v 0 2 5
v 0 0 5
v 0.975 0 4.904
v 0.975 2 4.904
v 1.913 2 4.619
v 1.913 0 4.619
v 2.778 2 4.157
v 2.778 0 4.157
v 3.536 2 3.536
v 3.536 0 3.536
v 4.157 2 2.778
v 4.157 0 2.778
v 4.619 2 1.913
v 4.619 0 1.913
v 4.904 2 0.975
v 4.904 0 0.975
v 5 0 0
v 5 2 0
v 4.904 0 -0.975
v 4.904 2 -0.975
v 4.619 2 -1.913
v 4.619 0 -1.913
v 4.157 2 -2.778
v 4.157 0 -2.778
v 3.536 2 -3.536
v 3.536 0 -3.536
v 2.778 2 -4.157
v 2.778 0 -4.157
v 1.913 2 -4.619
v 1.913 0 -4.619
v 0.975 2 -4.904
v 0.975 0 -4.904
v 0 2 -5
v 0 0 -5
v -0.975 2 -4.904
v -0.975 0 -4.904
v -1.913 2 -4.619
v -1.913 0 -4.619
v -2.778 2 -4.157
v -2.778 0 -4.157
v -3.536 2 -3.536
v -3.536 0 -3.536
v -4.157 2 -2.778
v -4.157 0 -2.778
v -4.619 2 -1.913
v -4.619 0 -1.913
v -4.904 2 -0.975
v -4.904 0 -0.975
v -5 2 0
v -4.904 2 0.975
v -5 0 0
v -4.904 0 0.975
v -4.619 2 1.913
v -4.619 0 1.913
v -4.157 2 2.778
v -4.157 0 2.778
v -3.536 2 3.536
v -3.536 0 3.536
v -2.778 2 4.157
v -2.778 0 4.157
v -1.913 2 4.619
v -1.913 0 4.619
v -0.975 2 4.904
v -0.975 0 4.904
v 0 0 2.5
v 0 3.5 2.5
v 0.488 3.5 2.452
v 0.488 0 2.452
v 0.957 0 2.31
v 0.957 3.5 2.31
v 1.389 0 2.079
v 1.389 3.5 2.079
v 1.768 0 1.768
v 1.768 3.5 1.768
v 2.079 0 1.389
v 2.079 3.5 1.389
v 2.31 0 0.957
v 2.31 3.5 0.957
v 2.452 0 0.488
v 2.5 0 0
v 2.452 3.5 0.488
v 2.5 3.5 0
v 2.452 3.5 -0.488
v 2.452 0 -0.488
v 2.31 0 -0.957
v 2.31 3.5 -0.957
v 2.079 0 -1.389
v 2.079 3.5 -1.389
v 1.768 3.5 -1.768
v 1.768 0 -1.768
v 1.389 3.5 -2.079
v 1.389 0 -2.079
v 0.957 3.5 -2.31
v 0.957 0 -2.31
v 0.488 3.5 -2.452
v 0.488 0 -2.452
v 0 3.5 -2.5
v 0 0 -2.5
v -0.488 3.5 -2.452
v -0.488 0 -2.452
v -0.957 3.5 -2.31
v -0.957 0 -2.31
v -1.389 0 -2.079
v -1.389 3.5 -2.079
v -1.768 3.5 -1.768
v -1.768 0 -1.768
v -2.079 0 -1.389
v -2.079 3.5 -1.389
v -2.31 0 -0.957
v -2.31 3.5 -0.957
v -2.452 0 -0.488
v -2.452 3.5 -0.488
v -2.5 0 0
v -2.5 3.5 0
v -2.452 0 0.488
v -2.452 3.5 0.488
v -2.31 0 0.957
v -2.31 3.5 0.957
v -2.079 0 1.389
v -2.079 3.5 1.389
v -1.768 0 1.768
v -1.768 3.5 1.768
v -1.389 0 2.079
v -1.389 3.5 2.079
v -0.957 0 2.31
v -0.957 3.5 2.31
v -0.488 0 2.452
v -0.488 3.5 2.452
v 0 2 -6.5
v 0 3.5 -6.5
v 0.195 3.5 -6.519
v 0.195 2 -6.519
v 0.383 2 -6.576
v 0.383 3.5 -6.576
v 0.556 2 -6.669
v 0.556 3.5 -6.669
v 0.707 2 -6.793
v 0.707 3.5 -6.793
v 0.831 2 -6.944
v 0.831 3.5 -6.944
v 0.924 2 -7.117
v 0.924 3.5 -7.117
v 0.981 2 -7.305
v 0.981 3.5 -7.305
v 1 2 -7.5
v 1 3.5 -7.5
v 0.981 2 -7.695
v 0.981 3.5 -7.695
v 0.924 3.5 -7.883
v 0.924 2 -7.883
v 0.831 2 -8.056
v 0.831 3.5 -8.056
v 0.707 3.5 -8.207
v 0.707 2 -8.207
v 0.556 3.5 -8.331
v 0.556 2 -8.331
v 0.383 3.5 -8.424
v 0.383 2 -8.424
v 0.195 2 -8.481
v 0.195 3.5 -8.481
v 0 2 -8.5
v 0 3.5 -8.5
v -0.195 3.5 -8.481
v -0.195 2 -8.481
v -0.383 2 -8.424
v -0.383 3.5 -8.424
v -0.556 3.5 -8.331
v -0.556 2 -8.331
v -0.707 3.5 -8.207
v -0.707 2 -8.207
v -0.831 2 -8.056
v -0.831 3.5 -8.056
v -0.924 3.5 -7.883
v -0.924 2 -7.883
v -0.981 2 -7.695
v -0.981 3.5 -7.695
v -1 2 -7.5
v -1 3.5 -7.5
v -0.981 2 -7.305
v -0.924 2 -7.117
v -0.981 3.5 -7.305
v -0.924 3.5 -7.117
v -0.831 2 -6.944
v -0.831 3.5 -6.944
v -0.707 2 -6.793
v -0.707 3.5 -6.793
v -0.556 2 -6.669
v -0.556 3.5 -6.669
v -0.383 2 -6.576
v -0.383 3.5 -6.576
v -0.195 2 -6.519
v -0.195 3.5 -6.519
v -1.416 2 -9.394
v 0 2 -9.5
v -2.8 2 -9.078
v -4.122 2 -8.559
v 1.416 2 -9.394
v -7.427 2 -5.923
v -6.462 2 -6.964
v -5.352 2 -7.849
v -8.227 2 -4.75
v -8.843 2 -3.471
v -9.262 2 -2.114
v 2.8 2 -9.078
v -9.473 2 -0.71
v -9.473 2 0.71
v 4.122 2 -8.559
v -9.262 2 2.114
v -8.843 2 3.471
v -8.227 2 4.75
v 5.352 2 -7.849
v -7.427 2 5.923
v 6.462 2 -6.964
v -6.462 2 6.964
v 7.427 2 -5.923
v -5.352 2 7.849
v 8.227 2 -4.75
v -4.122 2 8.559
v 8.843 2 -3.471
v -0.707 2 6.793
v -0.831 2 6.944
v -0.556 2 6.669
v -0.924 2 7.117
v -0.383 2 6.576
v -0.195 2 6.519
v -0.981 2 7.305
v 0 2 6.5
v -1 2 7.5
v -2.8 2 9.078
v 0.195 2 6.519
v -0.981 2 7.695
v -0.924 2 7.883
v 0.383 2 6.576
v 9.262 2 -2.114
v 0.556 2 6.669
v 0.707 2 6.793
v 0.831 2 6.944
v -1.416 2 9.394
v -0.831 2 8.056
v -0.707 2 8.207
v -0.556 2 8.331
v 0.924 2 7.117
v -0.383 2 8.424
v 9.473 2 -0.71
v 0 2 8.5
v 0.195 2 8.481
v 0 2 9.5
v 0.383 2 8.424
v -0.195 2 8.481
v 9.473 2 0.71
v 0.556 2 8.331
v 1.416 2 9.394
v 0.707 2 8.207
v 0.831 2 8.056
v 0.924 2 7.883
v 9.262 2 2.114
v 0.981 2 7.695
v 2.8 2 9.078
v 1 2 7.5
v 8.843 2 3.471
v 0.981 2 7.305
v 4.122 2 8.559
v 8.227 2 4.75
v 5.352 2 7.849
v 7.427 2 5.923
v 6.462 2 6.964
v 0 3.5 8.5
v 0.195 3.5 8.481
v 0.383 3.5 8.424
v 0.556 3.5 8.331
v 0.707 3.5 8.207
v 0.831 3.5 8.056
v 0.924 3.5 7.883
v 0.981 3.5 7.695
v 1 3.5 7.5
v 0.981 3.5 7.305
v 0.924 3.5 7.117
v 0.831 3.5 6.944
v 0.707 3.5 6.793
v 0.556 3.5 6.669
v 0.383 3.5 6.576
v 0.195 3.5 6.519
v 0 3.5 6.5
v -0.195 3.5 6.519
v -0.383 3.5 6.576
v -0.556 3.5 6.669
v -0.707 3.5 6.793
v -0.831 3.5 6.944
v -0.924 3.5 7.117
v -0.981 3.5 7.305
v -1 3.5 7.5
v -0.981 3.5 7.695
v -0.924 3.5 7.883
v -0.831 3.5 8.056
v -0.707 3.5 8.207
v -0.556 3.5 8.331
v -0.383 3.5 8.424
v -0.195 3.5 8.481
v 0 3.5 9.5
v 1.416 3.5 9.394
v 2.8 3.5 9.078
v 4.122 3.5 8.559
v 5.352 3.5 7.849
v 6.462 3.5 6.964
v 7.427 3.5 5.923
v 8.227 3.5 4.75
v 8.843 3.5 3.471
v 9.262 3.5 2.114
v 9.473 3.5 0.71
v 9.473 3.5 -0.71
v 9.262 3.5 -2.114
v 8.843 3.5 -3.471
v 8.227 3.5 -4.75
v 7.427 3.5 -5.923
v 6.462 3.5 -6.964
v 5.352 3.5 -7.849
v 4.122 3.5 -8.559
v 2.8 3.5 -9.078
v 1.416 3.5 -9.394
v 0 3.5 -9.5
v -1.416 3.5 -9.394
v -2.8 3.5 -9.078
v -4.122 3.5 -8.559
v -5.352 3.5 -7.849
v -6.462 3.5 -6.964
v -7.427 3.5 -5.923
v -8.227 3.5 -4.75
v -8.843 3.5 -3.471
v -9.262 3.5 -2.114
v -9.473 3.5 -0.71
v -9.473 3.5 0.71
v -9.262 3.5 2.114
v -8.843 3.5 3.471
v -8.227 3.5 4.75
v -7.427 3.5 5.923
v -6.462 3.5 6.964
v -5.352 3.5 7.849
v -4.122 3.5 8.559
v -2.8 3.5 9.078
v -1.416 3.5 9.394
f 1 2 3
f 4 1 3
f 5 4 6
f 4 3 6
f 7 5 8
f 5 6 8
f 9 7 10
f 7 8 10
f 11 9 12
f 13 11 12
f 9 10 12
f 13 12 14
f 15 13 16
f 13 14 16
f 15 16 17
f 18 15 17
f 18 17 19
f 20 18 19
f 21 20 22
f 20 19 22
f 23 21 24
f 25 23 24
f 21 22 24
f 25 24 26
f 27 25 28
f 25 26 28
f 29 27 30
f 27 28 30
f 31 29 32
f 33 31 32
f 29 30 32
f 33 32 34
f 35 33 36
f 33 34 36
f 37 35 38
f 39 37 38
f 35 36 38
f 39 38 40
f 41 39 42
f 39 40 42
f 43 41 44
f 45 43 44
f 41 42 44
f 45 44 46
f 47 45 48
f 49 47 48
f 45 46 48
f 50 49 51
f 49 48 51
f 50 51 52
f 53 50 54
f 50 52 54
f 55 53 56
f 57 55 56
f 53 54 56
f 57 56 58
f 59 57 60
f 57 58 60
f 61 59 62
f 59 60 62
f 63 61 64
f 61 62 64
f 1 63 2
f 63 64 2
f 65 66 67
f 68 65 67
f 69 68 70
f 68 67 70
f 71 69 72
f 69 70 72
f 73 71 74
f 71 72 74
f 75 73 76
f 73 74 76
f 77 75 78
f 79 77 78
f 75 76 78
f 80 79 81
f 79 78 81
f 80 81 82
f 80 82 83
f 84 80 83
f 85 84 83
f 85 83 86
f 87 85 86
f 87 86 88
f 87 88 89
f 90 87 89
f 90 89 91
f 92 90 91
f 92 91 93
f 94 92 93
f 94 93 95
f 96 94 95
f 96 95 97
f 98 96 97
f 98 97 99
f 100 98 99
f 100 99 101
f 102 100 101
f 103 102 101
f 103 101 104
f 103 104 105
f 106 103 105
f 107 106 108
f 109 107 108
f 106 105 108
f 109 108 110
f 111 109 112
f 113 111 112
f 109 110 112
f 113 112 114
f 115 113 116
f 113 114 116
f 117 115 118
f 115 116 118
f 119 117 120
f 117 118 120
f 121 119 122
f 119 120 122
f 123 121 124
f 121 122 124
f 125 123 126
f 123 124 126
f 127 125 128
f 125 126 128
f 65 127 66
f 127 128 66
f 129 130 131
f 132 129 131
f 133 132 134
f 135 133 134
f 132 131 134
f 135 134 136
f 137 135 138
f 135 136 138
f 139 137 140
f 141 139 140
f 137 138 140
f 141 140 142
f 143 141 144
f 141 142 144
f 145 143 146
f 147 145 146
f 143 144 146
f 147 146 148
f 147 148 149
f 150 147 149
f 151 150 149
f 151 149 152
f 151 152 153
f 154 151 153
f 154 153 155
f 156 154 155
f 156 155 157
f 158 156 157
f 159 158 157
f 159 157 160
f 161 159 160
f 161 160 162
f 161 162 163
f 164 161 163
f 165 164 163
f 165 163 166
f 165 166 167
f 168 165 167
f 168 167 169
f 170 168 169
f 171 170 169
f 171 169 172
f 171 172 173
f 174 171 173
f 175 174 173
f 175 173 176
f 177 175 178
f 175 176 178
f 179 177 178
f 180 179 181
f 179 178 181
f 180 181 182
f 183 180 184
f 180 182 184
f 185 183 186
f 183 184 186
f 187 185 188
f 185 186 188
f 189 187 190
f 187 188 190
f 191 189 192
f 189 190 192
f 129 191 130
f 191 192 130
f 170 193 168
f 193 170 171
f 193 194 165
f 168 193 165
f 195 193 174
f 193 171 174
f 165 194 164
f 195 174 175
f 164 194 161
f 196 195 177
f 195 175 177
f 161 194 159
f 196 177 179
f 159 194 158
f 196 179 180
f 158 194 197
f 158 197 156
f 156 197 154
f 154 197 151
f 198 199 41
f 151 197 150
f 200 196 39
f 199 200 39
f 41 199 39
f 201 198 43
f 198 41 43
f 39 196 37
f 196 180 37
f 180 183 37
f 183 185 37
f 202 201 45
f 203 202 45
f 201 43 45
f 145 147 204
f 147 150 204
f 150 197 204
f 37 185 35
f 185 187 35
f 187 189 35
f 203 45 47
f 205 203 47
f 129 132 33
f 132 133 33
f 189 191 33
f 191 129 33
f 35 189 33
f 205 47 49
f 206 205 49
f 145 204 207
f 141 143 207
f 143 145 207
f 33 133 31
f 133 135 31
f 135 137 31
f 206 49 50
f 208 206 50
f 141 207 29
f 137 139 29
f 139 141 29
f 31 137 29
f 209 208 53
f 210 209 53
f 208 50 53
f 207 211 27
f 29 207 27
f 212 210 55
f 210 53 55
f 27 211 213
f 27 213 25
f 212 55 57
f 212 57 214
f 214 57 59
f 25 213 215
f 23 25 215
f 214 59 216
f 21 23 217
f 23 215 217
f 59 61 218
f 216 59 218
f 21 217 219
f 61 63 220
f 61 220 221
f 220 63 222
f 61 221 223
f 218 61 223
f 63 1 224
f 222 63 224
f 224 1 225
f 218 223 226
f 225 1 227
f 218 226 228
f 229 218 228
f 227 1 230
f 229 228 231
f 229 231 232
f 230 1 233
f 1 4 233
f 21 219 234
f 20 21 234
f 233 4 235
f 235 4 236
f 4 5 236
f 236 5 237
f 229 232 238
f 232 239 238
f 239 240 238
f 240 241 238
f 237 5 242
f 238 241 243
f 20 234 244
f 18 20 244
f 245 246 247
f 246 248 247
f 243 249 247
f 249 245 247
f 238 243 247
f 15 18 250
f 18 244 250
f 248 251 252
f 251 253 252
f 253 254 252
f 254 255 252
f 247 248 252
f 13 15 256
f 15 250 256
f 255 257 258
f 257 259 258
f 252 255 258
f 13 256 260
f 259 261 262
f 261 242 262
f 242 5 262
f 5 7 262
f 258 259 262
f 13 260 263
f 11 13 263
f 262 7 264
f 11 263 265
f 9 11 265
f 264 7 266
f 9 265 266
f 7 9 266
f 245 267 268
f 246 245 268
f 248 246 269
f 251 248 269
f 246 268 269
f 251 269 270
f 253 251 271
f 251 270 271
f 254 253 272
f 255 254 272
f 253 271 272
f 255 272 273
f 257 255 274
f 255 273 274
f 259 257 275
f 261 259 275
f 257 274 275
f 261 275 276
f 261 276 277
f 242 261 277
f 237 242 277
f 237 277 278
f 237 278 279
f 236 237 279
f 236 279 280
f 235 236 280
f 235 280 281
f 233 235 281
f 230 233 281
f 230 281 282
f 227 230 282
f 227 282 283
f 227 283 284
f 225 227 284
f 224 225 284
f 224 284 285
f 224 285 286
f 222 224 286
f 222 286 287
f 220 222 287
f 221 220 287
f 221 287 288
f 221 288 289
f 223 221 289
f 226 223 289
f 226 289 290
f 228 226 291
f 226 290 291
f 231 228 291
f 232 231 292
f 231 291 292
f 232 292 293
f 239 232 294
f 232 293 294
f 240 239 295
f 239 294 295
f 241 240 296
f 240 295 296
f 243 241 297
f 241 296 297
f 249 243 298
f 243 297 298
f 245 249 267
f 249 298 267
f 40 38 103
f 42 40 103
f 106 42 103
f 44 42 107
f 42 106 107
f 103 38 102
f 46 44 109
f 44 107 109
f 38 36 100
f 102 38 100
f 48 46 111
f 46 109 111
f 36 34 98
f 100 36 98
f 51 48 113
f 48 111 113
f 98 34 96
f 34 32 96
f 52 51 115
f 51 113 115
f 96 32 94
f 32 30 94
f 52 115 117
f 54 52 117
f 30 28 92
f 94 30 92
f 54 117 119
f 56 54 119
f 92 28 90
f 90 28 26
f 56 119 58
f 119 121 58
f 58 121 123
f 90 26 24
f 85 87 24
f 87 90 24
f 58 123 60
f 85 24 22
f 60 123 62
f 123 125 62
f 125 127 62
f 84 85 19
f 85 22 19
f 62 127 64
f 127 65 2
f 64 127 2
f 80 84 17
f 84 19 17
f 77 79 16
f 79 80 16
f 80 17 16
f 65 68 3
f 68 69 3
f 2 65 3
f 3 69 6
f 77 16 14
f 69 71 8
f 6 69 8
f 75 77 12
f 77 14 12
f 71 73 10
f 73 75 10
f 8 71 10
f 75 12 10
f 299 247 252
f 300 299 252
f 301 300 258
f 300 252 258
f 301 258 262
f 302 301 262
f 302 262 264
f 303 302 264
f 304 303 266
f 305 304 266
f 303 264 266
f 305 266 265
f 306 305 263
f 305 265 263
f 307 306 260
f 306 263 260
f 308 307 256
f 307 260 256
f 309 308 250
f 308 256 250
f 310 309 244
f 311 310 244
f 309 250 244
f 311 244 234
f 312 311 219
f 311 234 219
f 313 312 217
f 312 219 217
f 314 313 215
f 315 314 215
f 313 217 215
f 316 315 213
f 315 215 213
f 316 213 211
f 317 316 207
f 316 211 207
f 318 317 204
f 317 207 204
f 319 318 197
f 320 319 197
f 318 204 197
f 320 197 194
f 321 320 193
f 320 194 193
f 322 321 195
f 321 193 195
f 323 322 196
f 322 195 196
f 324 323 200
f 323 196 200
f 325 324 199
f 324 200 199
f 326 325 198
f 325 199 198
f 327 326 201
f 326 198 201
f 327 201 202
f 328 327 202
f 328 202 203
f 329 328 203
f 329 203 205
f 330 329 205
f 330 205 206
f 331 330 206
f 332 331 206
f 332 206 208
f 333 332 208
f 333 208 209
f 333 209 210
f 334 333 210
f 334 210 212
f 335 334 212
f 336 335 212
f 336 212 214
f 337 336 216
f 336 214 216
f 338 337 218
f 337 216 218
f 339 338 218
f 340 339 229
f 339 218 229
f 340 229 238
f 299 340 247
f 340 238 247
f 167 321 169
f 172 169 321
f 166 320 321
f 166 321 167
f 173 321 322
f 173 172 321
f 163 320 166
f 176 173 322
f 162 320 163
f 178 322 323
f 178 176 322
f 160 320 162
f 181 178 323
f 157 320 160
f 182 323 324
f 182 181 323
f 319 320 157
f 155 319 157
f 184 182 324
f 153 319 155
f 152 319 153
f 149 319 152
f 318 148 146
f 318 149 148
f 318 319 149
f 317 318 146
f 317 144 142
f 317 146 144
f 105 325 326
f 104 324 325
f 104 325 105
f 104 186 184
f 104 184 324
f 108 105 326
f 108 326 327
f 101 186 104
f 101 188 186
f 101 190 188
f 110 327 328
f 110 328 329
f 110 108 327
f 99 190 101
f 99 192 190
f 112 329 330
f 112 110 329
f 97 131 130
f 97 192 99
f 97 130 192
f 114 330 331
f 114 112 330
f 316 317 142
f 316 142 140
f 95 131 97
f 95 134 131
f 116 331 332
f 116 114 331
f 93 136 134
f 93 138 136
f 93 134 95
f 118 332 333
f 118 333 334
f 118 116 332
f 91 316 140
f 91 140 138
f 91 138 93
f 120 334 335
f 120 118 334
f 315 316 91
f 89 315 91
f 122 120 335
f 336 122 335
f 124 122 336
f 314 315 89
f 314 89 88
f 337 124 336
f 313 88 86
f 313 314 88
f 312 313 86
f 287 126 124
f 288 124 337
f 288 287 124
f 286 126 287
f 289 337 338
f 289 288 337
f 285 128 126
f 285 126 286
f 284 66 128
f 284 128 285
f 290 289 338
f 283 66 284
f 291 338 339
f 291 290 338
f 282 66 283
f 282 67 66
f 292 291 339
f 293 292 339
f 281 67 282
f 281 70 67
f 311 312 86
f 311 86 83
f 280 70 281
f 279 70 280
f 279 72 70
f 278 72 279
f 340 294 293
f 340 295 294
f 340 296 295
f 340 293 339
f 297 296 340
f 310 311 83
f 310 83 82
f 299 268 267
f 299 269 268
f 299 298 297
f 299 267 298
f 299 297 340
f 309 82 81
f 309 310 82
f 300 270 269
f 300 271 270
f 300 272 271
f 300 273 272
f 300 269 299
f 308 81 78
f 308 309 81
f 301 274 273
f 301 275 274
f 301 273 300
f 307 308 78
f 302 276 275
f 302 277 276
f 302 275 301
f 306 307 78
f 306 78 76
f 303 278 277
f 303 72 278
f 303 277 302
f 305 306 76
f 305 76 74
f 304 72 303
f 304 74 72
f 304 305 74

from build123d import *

# Parameters (mm, degrees)
ESQUISSE1_R      = 5
EXTRUSION1_DEPTH = 2
ESQUISSE2_R      = 9.5
EXTRUSION2_DEPTH = 1.5
ESQUISSE3_R      = 2.5
ESQUISSE3_R_2    = 1
EXTRUSION3_DEPTH = 14.883443377


with BuildPart() as part:
    # Esquisse1 → Extrusion1 (new body)
    with BuildSketch(Plane(origin=(0, 0, 0), x_dir=(1, 0, 0), z_dir=(0, 1, 0))):
        with Locations(Location((0, 0, 0), (0, 0, 270))):
            Circle(ESQUISSE1_R)
    extrude(amount=EXTRUSION1_DEPTH)

    # Esquisse2 → Extrusion2 (add)
    with BuildSketch(Plane(origin=(0, 2, 0), x_dir=(-1, 0, 0), z_dir=(0, 1, 0))):
        with Locations(Location((0, 0, 0), (0, 0, 90))):
            Circle(ESQUISSE2_R)
    extrude(amount=EXTRUSION2_DEPTH)

    # Esquisse3 → Extrusion3 (cut, through all)
    with BuildSketch(Plane(origin=(0, 3.5, 0), x_dir=(-1, 0, 0), z_dir=(0, 1, 0))):
        with Locations(Location((0, 0, 0), (0, 0, 90))):
            Circle(ESQUISSE3_R)
        with Locations(Location((0, -7.5, 0), (0, 0, 90))):
            Circle(ESQUISSE3_R_2)
        with Locations(Location((0, 7.5, 0), (0, 0, 90))):
            Circle(ESQUISSE3_R_2)
    extrude(amount=-EXTRUSION3_DEPTH, mode=Mode.SUBTRACT)


solid = part.part
